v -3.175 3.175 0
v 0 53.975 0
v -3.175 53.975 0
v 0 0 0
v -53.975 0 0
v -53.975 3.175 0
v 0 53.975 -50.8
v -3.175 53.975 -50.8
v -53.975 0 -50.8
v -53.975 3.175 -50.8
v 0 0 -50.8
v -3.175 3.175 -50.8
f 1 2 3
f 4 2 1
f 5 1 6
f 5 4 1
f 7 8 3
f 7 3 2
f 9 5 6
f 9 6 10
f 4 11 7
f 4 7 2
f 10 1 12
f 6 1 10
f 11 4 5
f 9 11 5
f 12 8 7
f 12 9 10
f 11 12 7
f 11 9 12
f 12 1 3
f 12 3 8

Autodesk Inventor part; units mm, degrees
ref_plane "YZ Plane" through (0, 0, 0) normal (1, 0, 0) x (0, 1, 0)
ref_plane "XZ Plane" through (0, 0, 0) normal (0, 1, 0) x (-1, 0, 0)
ref_plane "XY Plane" through (0, 0, 0) normal (0, 0, 1) x (1, 0, 0)
sketch "Sketch1" plane through (0, 0, 0) normal (0, 1, 0) x (-1, 0, 0)
  line L0 (0, 0) -> (53.975, 0)
  line L1 (53.975, 0) -> (53.975, -50.8)
  line L2 (53.975, -50.8) -> (0, -50.8)
  line L3 (0, -50.8) -> (0, 0)
  dimension "d0" = 53.975
  dimension "d1" = 50.8
extrude "Extrusion1" add sketch "Sketch1" along normal blind 3.175
sketch "Sketch2" plane through (0, 3.175, 0) normal (0, 1, 0) x (1, 0, 0)
  line L0 (0, 50.8) -> (-53.975, 50.8) projected
  line L1 (0, 0) -> (-3.175, 0)
  line L2 (-3.175, 0) -> (-3.175, 50.8)
  line L3 (-3.175, 50.8) -> (0, 50.8)
  line L4 (0, 50.8) -> (0, 0)
  dimension "d4" = 3.175
extrude "Extrusion2" add sketch "Sketch2" along normal blind 50.8
properties part number "H"
